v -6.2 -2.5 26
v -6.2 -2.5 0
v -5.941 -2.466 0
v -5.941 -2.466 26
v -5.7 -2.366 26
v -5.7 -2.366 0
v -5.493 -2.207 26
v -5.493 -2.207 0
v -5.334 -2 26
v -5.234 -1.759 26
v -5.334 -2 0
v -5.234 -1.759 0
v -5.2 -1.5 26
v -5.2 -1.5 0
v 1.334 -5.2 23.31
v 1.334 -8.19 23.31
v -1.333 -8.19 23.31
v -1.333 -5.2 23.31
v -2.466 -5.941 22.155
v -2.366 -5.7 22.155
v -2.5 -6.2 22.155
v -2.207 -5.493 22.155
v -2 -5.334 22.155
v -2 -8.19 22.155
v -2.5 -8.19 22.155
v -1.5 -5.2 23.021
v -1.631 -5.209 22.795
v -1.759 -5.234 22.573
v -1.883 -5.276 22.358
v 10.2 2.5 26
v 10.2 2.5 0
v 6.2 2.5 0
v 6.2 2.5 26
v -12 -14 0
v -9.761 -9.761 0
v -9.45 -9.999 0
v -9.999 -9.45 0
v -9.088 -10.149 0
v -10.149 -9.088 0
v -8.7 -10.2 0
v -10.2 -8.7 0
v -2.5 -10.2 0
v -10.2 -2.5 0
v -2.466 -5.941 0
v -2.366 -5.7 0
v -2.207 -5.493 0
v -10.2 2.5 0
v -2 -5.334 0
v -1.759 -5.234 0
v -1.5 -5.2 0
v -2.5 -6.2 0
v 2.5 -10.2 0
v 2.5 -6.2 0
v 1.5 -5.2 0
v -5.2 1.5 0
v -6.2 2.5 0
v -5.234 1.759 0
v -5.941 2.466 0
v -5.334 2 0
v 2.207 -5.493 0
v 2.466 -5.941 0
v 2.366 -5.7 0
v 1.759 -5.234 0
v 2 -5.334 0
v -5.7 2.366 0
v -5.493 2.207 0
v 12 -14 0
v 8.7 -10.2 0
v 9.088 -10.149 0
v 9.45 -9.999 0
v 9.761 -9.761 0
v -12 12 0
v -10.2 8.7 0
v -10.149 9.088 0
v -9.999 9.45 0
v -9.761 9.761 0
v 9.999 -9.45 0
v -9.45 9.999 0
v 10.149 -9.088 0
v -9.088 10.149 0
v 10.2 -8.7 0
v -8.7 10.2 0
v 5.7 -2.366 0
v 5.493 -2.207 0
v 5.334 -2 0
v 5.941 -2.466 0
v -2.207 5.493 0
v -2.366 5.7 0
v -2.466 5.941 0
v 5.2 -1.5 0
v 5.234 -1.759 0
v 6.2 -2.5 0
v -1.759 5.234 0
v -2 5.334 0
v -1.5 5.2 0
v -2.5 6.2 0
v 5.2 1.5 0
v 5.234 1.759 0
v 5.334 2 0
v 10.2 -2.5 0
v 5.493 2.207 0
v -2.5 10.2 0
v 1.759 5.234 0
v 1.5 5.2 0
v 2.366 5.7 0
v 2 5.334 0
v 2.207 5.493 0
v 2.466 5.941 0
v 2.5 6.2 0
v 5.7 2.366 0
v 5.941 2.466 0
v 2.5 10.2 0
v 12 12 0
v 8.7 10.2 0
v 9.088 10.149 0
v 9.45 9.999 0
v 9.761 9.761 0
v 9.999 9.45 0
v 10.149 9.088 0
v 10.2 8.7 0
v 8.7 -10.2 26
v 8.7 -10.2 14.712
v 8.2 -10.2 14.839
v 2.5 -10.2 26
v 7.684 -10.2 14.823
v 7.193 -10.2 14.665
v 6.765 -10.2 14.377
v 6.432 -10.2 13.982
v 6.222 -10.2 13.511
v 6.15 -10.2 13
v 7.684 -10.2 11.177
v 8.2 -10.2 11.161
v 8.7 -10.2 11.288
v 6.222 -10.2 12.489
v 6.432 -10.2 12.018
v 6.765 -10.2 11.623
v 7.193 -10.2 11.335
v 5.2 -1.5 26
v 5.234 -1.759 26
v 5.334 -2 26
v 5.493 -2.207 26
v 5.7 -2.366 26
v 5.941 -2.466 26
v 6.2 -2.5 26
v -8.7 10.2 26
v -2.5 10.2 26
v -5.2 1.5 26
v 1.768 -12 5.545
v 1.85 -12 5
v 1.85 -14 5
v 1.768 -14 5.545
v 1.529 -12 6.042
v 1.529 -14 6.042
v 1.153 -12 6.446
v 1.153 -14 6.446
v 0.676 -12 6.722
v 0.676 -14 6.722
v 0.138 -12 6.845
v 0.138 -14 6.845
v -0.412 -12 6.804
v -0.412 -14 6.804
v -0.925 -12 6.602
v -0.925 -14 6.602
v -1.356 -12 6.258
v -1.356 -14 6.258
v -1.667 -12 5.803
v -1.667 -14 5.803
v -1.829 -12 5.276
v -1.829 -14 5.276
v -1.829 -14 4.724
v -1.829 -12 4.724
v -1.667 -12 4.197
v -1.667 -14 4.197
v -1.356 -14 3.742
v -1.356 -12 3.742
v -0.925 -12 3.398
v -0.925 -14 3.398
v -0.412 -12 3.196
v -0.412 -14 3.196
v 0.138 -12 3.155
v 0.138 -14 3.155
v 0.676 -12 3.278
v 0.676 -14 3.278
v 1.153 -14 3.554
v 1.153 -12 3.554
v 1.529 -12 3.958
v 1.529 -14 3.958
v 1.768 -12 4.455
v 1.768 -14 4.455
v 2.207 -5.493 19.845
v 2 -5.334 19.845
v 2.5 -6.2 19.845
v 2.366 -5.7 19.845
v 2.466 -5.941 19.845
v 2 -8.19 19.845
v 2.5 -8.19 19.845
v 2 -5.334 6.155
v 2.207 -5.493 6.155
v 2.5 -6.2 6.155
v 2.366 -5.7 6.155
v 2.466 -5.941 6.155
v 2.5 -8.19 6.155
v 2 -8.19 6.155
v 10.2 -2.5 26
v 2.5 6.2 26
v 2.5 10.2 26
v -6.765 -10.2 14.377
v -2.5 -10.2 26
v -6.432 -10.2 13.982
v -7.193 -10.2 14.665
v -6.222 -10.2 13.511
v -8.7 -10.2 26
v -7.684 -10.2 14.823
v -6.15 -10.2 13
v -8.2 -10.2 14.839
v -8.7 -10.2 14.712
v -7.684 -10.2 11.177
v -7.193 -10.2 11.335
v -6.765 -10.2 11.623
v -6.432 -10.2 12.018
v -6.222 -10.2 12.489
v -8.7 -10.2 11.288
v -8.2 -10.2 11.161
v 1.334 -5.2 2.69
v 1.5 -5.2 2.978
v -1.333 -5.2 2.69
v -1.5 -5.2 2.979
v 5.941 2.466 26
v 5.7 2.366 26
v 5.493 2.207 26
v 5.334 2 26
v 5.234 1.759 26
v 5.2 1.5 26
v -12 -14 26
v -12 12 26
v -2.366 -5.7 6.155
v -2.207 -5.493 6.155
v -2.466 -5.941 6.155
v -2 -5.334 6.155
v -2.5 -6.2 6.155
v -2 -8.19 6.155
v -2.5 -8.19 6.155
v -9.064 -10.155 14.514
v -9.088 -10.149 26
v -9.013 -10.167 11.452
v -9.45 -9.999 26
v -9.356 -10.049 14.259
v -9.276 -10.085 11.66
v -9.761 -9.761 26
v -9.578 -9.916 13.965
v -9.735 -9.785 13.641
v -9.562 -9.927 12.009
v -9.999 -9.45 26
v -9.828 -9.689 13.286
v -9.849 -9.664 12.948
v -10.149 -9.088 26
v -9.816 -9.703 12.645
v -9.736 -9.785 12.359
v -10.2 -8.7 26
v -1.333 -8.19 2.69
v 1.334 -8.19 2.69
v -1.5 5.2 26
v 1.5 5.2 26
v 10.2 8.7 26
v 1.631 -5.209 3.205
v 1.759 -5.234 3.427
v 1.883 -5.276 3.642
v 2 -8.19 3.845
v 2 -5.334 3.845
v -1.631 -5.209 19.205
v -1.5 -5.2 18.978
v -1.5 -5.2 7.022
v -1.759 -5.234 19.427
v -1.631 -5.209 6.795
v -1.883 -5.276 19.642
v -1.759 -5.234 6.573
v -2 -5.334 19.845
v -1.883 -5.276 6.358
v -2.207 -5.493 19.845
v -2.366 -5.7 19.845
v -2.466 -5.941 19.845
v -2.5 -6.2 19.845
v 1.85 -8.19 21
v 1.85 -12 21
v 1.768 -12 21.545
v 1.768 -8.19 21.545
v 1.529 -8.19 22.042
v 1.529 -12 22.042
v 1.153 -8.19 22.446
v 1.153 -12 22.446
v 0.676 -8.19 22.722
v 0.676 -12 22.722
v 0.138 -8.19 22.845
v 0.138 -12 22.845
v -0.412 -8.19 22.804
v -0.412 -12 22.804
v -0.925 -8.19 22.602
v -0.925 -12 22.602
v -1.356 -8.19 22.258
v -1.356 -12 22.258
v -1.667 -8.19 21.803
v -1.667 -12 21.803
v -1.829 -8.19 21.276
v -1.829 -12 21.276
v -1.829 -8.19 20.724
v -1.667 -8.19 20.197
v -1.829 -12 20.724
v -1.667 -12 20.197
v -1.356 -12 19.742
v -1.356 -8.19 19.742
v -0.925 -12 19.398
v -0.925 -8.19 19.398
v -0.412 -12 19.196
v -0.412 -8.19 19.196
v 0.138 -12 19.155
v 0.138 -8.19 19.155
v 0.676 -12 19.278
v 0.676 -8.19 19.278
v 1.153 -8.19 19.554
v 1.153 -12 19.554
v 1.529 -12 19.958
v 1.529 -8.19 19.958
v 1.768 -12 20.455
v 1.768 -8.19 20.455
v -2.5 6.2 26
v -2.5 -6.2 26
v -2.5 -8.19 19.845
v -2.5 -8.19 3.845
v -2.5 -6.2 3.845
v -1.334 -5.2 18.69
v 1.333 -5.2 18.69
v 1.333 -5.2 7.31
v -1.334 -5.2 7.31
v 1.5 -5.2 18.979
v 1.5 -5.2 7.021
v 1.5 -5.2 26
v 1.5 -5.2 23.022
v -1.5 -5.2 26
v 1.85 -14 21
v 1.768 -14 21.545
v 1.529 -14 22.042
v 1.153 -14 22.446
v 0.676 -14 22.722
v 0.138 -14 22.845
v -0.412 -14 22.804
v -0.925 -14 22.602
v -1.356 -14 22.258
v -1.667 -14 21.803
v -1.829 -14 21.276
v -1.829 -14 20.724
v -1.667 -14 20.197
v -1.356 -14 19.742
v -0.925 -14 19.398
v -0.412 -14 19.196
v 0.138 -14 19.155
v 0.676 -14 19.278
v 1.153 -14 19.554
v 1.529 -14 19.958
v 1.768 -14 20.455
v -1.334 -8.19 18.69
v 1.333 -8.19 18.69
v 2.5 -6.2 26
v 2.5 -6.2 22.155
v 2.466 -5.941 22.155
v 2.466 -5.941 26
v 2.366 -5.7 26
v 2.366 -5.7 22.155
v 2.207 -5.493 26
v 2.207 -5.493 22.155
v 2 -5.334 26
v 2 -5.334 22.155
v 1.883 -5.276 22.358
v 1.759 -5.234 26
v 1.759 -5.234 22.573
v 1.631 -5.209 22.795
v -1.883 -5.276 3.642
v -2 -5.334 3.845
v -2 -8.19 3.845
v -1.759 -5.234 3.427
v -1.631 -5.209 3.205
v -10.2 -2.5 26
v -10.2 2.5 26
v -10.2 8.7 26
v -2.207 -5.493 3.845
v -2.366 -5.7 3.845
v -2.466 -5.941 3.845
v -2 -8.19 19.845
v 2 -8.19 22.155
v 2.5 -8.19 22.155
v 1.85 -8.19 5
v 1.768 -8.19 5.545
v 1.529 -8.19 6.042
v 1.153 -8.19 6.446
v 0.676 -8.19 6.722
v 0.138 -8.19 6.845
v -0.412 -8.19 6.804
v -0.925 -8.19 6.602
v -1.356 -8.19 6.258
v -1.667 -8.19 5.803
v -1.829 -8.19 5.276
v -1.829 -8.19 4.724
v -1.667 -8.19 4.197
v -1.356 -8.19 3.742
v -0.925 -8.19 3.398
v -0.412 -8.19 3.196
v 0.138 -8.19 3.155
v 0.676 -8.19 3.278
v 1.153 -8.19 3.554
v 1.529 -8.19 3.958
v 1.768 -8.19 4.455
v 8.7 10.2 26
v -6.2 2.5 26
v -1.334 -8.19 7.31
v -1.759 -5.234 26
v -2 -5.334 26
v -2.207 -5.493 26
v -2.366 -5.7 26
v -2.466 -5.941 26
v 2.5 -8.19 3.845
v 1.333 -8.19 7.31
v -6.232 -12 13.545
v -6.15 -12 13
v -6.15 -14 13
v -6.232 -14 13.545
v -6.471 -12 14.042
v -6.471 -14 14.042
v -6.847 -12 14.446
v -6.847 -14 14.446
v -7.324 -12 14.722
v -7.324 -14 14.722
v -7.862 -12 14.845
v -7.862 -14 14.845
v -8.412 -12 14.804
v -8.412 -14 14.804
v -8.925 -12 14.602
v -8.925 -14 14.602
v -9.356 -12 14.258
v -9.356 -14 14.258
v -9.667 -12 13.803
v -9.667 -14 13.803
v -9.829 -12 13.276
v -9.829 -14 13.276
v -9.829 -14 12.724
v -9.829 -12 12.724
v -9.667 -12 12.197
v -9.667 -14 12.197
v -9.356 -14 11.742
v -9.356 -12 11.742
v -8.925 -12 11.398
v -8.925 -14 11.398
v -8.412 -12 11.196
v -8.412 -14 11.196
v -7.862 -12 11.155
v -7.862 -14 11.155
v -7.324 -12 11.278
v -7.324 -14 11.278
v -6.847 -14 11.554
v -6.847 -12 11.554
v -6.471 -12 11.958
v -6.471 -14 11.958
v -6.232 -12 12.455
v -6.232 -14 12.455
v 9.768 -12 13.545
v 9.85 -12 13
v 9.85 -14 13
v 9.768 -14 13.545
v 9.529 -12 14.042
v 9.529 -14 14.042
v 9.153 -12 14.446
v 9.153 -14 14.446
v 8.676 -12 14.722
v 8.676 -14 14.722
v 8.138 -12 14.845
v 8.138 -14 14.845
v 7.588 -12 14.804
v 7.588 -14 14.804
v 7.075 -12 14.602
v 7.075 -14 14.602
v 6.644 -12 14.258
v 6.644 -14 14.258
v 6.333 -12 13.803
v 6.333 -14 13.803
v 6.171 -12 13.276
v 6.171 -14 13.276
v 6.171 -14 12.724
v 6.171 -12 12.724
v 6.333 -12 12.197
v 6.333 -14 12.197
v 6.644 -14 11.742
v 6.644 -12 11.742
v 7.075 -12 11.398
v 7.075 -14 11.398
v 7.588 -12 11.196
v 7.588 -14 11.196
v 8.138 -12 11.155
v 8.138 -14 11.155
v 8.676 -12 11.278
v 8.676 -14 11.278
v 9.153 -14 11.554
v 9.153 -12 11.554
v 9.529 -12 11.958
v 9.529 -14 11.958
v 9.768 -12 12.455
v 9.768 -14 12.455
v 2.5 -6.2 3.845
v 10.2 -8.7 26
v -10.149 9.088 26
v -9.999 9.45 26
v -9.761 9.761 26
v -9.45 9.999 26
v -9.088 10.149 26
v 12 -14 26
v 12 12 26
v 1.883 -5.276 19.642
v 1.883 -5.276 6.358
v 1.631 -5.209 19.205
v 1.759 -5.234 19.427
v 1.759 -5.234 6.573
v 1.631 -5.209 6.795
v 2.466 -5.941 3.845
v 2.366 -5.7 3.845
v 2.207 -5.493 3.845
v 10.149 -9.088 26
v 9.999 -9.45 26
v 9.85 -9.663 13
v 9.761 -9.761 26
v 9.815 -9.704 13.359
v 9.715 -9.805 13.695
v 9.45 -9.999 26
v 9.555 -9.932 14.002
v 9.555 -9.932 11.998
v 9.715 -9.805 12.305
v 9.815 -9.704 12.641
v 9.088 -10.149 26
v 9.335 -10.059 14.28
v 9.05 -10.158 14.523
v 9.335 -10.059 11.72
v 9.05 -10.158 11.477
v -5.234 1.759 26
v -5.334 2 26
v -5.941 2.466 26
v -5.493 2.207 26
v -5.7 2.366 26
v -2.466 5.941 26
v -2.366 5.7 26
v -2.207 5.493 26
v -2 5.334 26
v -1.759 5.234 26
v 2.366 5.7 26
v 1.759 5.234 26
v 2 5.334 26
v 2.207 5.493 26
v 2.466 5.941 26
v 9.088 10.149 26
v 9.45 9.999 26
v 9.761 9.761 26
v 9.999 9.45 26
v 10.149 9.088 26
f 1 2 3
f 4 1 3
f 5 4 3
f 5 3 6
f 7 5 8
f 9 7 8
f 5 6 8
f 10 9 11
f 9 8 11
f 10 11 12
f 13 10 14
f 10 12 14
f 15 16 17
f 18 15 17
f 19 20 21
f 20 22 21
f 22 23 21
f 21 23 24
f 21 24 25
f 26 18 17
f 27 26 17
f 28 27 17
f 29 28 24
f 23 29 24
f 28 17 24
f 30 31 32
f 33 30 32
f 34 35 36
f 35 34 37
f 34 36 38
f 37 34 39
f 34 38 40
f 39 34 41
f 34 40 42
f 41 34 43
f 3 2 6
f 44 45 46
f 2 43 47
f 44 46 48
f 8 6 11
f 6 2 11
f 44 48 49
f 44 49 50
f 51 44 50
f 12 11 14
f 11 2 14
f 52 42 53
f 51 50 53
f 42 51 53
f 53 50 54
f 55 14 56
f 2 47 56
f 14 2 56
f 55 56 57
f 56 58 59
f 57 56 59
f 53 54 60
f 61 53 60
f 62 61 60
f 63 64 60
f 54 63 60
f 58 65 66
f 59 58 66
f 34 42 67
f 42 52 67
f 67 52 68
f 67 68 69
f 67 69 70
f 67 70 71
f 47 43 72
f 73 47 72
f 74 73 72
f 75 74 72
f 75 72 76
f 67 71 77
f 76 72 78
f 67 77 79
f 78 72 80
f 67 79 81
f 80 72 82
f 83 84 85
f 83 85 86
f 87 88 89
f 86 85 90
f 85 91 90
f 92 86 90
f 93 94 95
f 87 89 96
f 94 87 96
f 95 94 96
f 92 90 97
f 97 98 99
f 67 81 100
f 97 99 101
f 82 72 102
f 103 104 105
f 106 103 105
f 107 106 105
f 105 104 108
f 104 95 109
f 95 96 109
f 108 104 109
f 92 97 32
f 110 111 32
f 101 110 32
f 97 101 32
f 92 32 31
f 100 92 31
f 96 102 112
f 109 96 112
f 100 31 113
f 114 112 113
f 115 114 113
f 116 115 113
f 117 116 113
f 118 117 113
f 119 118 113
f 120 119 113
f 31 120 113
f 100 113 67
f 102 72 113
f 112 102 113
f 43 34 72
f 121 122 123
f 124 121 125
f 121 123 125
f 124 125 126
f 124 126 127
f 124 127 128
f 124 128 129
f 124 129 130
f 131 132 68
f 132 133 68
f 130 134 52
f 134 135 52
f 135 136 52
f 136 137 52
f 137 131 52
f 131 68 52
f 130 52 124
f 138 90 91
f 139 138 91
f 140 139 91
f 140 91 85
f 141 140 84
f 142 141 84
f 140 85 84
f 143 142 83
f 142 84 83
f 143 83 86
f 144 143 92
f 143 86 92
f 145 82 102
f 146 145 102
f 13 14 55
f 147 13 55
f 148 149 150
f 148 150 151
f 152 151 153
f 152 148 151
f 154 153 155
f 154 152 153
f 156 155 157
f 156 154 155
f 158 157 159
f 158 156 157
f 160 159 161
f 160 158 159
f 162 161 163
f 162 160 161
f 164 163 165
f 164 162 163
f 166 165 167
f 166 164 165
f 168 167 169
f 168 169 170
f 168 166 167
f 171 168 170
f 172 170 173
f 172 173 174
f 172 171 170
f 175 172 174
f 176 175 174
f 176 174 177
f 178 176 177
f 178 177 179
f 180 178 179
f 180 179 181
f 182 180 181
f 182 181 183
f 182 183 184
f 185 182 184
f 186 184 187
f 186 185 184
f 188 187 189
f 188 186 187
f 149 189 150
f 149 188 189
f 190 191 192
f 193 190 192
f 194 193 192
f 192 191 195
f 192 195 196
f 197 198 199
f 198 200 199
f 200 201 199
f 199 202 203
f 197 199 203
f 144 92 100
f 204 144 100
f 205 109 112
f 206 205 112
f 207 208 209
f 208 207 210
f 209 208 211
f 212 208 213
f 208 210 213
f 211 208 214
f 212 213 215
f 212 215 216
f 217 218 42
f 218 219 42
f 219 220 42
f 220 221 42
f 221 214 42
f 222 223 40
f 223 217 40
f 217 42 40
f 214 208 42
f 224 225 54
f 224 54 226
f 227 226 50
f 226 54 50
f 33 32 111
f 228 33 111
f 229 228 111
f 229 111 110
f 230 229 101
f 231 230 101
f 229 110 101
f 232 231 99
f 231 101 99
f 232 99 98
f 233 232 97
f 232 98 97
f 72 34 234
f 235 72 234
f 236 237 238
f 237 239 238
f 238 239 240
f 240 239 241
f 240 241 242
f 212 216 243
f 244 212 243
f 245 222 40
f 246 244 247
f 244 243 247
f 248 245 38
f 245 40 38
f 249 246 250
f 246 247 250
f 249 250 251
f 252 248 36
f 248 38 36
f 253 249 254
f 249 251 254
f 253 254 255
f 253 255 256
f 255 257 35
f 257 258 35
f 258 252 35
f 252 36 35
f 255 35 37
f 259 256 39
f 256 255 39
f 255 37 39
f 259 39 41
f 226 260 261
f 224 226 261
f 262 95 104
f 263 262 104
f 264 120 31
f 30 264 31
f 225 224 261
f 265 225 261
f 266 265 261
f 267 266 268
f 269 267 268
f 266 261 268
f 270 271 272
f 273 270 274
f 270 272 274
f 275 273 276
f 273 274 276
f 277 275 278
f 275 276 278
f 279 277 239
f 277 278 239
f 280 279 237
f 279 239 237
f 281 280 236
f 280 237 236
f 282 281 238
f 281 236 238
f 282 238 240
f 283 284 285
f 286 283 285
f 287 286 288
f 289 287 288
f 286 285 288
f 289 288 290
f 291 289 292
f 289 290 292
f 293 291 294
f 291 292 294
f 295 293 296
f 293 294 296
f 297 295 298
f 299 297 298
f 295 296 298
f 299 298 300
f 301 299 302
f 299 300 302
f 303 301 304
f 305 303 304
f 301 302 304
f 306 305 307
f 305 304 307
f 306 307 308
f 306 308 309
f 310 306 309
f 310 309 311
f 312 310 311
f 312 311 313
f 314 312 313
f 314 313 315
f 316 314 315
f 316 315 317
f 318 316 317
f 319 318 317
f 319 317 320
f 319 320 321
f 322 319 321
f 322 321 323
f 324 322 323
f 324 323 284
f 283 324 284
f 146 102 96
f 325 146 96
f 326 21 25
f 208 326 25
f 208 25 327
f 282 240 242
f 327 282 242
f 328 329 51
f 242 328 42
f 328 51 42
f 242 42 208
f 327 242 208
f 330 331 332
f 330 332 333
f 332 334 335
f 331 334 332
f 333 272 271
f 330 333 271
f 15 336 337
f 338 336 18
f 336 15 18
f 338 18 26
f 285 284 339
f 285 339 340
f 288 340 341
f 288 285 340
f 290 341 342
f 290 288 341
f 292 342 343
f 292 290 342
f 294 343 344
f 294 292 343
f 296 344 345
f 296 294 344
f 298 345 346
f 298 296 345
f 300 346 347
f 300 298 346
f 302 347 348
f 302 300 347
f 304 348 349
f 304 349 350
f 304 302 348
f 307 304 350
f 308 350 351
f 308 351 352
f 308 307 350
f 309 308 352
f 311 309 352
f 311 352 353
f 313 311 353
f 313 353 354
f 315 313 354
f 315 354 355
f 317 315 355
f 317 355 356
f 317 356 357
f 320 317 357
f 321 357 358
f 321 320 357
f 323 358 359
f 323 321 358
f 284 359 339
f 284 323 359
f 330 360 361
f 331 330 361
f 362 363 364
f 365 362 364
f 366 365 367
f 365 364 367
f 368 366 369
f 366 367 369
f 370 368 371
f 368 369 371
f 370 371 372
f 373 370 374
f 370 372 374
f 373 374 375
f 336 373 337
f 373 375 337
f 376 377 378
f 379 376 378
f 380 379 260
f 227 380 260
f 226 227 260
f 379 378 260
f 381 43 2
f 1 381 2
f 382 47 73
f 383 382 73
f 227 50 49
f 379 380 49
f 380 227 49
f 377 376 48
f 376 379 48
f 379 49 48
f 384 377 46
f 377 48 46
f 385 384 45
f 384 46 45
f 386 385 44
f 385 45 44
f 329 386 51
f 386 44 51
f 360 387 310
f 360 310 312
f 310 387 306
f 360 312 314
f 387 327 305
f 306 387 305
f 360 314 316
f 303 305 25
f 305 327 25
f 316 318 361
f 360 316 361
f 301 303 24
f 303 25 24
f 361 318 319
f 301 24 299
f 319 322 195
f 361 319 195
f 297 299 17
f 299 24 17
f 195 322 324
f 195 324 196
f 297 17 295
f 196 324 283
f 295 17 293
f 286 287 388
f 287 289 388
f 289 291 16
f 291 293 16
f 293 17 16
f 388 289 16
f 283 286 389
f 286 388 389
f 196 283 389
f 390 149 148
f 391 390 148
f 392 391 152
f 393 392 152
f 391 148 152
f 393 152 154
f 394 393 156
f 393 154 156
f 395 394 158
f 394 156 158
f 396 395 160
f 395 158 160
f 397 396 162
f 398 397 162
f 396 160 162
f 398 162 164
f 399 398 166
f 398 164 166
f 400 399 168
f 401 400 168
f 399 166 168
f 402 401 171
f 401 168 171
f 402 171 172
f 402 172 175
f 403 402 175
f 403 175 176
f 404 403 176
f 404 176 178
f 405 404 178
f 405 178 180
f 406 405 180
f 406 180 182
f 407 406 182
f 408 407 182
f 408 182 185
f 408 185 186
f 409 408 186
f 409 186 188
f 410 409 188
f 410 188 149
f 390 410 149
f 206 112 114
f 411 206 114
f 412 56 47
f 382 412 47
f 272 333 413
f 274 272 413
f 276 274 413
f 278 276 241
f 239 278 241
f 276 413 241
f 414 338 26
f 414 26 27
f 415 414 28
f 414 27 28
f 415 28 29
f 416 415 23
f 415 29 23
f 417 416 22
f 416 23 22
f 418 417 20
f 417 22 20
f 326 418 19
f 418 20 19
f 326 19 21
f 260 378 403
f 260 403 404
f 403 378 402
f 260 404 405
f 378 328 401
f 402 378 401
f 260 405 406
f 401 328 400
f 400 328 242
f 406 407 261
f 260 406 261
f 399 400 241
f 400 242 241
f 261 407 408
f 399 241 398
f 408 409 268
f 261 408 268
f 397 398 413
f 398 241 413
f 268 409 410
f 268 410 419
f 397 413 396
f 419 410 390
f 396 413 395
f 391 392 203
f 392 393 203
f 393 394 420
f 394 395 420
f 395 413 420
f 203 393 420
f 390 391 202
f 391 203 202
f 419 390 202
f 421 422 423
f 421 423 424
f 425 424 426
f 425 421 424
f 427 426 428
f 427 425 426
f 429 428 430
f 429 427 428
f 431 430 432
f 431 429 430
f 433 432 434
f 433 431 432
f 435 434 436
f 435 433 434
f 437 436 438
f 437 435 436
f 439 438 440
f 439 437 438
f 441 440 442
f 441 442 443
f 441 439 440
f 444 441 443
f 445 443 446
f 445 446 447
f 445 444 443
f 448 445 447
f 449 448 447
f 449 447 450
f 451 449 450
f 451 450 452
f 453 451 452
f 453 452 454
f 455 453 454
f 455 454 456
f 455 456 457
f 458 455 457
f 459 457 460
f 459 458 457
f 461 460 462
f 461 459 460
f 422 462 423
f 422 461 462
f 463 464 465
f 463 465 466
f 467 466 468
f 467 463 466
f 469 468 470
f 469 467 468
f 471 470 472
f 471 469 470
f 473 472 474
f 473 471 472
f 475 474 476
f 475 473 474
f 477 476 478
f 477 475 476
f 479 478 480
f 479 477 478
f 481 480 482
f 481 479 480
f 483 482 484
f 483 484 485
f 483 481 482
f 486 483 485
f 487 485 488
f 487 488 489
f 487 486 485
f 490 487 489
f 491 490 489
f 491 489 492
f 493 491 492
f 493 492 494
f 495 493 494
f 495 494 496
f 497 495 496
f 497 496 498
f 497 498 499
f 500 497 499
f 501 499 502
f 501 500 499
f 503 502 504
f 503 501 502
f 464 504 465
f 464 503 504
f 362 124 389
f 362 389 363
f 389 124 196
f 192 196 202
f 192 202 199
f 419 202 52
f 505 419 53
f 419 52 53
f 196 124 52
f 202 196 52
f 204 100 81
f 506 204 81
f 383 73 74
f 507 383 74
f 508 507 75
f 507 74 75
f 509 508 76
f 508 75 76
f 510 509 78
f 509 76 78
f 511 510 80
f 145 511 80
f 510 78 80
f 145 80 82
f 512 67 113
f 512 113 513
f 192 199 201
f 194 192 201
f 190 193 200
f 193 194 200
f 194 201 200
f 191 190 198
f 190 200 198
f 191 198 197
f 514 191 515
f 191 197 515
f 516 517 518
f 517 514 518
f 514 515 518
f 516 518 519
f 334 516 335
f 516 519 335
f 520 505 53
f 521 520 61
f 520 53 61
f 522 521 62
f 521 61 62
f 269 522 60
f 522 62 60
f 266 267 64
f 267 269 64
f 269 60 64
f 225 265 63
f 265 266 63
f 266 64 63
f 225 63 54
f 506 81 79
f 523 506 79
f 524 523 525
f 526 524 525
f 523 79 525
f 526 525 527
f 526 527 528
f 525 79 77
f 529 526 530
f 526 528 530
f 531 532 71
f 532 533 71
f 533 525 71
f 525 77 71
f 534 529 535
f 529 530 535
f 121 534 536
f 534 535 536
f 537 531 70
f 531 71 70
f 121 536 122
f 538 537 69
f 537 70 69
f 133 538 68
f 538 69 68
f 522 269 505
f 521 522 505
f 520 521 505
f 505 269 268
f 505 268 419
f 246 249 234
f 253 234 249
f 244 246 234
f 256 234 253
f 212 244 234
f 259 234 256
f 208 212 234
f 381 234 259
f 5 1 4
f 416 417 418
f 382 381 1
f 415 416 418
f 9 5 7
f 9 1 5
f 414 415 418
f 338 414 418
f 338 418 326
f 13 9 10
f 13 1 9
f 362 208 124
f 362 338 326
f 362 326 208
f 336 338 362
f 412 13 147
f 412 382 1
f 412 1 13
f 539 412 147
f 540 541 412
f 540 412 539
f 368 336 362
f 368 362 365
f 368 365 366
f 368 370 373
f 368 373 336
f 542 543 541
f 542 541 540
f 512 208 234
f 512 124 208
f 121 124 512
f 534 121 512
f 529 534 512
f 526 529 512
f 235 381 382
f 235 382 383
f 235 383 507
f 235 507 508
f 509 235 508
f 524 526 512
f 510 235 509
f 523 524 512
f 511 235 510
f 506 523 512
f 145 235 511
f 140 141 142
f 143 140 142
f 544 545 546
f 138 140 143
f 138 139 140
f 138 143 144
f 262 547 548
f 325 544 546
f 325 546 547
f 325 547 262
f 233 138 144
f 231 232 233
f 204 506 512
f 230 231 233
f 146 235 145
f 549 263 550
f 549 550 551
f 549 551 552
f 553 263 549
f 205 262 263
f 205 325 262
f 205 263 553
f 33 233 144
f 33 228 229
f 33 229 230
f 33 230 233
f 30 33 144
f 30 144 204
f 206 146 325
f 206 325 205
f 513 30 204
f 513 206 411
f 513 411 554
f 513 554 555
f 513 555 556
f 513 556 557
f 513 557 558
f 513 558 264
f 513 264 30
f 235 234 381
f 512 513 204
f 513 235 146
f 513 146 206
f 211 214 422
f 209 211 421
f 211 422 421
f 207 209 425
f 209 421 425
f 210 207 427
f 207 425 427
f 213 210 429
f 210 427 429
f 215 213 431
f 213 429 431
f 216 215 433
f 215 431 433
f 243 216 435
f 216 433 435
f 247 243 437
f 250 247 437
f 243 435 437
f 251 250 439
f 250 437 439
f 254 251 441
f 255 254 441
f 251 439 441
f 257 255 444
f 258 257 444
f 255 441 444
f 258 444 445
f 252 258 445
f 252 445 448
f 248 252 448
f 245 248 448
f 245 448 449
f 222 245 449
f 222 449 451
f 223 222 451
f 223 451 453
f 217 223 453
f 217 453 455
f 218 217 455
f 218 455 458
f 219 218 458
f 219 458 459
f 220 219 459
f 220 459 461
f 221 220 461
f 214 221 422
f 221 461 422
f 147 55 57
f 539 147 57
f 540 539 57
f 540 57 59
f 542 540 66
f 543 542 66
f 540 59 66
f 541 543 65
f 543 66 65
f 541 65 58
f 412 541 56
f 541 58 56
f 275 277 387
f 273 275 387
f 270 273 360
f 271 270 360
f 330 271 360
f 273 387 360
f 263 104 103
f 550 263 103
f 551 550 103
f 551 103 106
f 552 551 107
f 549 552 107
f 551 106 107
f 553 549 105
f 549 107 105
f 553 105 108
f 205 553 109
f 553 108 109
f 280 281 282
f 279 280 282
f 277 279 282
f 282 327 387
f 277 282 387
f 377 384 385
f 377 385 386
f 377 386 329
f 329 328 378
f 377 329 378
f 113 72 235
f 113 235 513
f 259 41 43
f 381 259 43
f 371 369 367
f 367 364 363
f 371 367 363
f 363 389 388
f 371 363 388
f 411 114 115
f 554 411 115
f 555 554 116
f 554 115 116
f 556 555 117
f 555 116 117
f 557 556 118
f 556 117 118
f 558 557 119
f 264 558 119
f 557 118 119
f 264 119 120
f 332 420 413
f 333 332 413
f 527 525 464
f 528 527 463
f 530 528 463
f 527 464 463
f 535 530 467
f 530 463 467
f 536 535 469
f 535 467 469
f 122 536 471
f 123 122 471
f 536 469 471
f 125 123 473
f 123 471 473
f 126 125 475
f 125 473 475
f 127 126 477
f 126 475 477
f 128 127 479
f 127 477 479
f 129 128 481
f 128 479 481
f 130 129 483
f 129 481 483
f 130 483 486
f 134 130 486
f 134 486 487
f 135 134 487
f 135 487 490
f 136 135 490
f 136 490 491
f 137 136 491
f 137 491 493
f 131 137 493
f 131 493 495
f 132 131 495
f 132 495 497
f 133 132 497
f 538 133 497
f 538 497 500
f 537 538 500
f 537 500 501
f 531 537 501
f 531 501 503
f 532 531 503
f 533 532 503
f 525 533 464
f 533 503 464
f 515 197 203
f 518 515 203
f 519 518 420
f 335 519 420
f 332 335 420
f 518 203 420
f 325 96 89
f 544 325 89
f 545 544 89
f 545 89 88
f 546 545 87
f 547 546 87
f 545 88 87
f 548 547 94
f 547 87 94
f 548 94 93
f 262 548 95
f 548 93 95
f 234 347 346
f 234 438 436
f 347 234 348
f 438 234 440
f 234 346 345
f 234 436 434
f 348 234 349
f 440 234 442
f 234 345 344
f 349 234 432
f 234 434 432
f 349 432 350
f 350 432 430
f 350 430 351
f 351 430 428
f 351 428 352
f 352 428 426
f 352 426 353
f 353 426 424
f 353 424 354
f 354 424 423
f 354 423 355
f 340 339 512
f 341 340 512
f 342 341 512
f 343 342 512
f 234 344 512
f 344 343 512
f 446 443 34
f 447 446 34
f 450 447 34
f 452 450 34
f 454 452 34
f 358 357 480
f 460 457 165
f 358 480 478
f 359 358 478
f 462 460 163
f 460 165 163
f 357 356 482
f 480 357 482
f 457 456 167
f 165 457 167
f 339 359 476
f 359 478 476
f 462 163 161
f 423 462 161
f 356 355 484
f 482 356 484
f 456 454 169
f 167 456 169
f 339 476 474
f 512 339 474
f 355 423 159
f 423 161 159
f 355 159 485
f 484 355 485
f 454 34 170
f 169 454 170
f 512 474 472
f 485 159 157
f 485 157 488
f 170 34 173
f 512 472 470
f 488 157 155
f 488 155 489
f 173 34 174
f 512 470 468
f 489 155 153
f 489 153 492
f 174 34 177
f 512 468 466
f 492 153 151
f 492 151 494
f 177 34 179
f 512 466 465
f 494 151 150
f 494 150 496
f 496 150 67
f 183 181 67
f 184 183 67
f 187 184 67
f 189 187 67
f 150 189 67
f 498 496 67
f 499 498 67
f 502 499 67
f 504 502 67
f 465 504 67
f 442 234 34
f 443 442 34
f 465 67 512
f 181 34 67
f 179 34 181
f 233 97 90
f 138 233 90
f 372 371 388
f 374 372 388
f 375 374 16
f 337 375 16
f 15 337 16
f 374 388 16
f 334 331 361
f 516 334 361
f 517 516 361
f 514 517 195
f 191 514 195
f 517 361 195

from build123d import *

# Parameters (mm, degrees)
F0_W     = 24
F0_H     = 24
F1_DEPTH = 26
F2_R     = 1.85
F3_DEPTH = 7.5
F5_START = -3.81
F4_R     = 1.85
F5_DEPTH = 3.19
F6_DEPTH = 2


with BuildPart() as f1:
    # F0 (on Top) → F1 (new body)
    with BuildSketch(Plane.XY):
        Rectangle(F0_W, F0_H)
        with BuildLine():
            Line((-10.2, -8.7), (-10.2, -8.6))
            Line((-10.2, -8.6), (-10.2, -2.5))
            Line((-10.2, -2.5), (-6.2, -2.5))
            ThreePointArc((-6.2, -2.5), (-5.4928932188, -2.2071067812), (-5.2, -1.5))
            Line((-5.2, -1.5), (-5.2, 1.5))
            ThreePointArc((-5.2, 1.5), (-5.4928932188, 2.2071067812), (-6.2, 2.5))
            Line((-6.2, 2.5), (-10.2, 2.5))
            Line((-10.2, 2.5), (-10.2, 8.7))
            ThreePointArc((-10.2, 8.7), (-9.7606601718, 9.7606601718), (-8.7, 10.2))
            Line((-8.7, 10.2), (-8.6, 10.2))
            Line((-8.6, 10.2), (-2.5, 10.2))
            Line((-2.5, 10.2), (-2.5, 6.2))
            ThreePointArc((-2.5, 6.2), (-2.2071067812, 5.4928932188), (-1.5, 5.2))
            Line((-1.5, 5.2), (1.5, 5.2))
            ThreePointArc((1.5, 5.2), (2.2071067812, 5.4928932188), (2.5, 6.2))
            Line((2.5, 6.2), (2.5, 10.2))
            Line((2.5, 10.2), (8.7, 10.2))
            ThreePointArc((8.7, 10.2), (9.7606601718, 9.7606601718), (10.2, 8.7))
            Line((10.2, 8.7), (10.2, 8.6))
            Line((10.2, 8.6), (10.2, 2.5))
            Line((10.2, 2.5), (6.2, 2.5))
            ThreePointArc((6.2, 2.5), (5.4928932188, 2.2071067812), (5.2, 1.5))
            Line((5.2, 1.5), (5.2, -1.5))
            ThreePointArc((5.2, -1.5), (5.4928932188, -2.2071067812), (6.2, -2.5))
            Line((6.2, -2.5), (10.2, -2.5))
            Line((10.2, -2.5), (10.2, -8.7))
            ThreePointArc((10.2, -8.7), (9.7606601718, -9.7606601718), (8.7, -10.2))
            Line((8.7, -10.2), (8.6, -10.2))
            Line((8.6, -10.2), (2.5, -10.2))
            Line((2.5, -10.2), (2.5, -6.2))
            ThreePointArc((2.5, -6.2), (2.2071067812, -5.4928932188), (1.5, -5.2))
            Line((1.5, -5.2), (-1.5, -5.2))
            ThreePointArc((-1.5, -5.2), (-2.2071067812, -5.4928932188), (-2.5, -6.2))
            Line((-2.5, -6.2), (-2.5, -10.2))
            Line((-2.5, -10.2), (-8.7, -10.2))
            ThreePointArc((-8.7, -10.2), (-9.7606601718, -9.7606601718), (-10.2, -8.7))
        make_face(mode=Mode.SUBTRACT)
    extrude(amount=F1_DEPTH)

    # F2 (on face) → F3 (cut)
    with BuildSketch(Plane.XZ.offset(12)):
        with Locations((0, 53)):
            Circle(F2_R)
        with Locations((8, 45)):
            Circle(F2_R)
        with Locations((-8, 45)):
            Circle(F2_R)
        with Locations((0, 37)):
            Circle(F2_R)
        with Locations((-8, 29)):
            Circle(F2_R)
        with Locations((0, 21)):
            Circle(F2_R)
        with Locations((8, 29)):
            Circle(F2_R)
        with Locations((8, 13)):
            Circle(F2_R)
        with Locations((-8, 13)):
            Circle(F2_R)
        with Locations((0, 5)):
            Circle(F2_R)
    extrude(amount=-F3_DEPTH, mode=Mode.SUBTRACT)

    # F4 (on face) → F5 (cut)
    with BuildSketch(Plane.XZ.offset(12).offset(F5_START)):
        Polygon((1.3331978443, 18.6901357984), (2.0000989222, 19.8448934496), (2.667, 19.8448934496), (2.667, 22.1545832015), (2.0004010778, 22.1545832015), (1.3338021557, 23.3095153022), (-1.3331978443, 23.3098642016), (-2.0004011691, 22.1545832015), (-2.667, 22.1545832015), (-2.667, 19.8448934496), (-2.0000989222, 19.8448934496), (-1.3338021557, 18.6904846978), align=None)
        with Locations((0, 21)):
            Circle(F4_R, mode=Mode.SUBTRACT)
        Polygon((2.667, 6.1551065504), (2.0000989222, 6.1551065504), (1.3331978443, 7.3098642016), (-1.3338021557, 7.3095153022), (-2.0000989906, 6.15510659), (-2.667, 6.1551065504), (-2.667, 3.8454167985), (-2.0004011691, 3.8454167985), (-1.3331978443, 2.6901357984), (1.3338021557, 2.6904846978), (2.0004010778, 3.8454167985), (2.667, 3.8454167985), align=None)
        with Locations((0, 5)):
            Circle(F4_R, mode=Mode.SUBTRACT)
    extrude(amount=-F5_DEPTH, mode=Mode.SUBTRACT)

    # F6 (add): a face of the model
    f6_faces = [f1.faces().sort_by_distance(p)[0] for p in [
        (0, -12, 13),
    ]]
    extrude(f6_faces, amount=F6_DEPTH)


solid = f1.part
